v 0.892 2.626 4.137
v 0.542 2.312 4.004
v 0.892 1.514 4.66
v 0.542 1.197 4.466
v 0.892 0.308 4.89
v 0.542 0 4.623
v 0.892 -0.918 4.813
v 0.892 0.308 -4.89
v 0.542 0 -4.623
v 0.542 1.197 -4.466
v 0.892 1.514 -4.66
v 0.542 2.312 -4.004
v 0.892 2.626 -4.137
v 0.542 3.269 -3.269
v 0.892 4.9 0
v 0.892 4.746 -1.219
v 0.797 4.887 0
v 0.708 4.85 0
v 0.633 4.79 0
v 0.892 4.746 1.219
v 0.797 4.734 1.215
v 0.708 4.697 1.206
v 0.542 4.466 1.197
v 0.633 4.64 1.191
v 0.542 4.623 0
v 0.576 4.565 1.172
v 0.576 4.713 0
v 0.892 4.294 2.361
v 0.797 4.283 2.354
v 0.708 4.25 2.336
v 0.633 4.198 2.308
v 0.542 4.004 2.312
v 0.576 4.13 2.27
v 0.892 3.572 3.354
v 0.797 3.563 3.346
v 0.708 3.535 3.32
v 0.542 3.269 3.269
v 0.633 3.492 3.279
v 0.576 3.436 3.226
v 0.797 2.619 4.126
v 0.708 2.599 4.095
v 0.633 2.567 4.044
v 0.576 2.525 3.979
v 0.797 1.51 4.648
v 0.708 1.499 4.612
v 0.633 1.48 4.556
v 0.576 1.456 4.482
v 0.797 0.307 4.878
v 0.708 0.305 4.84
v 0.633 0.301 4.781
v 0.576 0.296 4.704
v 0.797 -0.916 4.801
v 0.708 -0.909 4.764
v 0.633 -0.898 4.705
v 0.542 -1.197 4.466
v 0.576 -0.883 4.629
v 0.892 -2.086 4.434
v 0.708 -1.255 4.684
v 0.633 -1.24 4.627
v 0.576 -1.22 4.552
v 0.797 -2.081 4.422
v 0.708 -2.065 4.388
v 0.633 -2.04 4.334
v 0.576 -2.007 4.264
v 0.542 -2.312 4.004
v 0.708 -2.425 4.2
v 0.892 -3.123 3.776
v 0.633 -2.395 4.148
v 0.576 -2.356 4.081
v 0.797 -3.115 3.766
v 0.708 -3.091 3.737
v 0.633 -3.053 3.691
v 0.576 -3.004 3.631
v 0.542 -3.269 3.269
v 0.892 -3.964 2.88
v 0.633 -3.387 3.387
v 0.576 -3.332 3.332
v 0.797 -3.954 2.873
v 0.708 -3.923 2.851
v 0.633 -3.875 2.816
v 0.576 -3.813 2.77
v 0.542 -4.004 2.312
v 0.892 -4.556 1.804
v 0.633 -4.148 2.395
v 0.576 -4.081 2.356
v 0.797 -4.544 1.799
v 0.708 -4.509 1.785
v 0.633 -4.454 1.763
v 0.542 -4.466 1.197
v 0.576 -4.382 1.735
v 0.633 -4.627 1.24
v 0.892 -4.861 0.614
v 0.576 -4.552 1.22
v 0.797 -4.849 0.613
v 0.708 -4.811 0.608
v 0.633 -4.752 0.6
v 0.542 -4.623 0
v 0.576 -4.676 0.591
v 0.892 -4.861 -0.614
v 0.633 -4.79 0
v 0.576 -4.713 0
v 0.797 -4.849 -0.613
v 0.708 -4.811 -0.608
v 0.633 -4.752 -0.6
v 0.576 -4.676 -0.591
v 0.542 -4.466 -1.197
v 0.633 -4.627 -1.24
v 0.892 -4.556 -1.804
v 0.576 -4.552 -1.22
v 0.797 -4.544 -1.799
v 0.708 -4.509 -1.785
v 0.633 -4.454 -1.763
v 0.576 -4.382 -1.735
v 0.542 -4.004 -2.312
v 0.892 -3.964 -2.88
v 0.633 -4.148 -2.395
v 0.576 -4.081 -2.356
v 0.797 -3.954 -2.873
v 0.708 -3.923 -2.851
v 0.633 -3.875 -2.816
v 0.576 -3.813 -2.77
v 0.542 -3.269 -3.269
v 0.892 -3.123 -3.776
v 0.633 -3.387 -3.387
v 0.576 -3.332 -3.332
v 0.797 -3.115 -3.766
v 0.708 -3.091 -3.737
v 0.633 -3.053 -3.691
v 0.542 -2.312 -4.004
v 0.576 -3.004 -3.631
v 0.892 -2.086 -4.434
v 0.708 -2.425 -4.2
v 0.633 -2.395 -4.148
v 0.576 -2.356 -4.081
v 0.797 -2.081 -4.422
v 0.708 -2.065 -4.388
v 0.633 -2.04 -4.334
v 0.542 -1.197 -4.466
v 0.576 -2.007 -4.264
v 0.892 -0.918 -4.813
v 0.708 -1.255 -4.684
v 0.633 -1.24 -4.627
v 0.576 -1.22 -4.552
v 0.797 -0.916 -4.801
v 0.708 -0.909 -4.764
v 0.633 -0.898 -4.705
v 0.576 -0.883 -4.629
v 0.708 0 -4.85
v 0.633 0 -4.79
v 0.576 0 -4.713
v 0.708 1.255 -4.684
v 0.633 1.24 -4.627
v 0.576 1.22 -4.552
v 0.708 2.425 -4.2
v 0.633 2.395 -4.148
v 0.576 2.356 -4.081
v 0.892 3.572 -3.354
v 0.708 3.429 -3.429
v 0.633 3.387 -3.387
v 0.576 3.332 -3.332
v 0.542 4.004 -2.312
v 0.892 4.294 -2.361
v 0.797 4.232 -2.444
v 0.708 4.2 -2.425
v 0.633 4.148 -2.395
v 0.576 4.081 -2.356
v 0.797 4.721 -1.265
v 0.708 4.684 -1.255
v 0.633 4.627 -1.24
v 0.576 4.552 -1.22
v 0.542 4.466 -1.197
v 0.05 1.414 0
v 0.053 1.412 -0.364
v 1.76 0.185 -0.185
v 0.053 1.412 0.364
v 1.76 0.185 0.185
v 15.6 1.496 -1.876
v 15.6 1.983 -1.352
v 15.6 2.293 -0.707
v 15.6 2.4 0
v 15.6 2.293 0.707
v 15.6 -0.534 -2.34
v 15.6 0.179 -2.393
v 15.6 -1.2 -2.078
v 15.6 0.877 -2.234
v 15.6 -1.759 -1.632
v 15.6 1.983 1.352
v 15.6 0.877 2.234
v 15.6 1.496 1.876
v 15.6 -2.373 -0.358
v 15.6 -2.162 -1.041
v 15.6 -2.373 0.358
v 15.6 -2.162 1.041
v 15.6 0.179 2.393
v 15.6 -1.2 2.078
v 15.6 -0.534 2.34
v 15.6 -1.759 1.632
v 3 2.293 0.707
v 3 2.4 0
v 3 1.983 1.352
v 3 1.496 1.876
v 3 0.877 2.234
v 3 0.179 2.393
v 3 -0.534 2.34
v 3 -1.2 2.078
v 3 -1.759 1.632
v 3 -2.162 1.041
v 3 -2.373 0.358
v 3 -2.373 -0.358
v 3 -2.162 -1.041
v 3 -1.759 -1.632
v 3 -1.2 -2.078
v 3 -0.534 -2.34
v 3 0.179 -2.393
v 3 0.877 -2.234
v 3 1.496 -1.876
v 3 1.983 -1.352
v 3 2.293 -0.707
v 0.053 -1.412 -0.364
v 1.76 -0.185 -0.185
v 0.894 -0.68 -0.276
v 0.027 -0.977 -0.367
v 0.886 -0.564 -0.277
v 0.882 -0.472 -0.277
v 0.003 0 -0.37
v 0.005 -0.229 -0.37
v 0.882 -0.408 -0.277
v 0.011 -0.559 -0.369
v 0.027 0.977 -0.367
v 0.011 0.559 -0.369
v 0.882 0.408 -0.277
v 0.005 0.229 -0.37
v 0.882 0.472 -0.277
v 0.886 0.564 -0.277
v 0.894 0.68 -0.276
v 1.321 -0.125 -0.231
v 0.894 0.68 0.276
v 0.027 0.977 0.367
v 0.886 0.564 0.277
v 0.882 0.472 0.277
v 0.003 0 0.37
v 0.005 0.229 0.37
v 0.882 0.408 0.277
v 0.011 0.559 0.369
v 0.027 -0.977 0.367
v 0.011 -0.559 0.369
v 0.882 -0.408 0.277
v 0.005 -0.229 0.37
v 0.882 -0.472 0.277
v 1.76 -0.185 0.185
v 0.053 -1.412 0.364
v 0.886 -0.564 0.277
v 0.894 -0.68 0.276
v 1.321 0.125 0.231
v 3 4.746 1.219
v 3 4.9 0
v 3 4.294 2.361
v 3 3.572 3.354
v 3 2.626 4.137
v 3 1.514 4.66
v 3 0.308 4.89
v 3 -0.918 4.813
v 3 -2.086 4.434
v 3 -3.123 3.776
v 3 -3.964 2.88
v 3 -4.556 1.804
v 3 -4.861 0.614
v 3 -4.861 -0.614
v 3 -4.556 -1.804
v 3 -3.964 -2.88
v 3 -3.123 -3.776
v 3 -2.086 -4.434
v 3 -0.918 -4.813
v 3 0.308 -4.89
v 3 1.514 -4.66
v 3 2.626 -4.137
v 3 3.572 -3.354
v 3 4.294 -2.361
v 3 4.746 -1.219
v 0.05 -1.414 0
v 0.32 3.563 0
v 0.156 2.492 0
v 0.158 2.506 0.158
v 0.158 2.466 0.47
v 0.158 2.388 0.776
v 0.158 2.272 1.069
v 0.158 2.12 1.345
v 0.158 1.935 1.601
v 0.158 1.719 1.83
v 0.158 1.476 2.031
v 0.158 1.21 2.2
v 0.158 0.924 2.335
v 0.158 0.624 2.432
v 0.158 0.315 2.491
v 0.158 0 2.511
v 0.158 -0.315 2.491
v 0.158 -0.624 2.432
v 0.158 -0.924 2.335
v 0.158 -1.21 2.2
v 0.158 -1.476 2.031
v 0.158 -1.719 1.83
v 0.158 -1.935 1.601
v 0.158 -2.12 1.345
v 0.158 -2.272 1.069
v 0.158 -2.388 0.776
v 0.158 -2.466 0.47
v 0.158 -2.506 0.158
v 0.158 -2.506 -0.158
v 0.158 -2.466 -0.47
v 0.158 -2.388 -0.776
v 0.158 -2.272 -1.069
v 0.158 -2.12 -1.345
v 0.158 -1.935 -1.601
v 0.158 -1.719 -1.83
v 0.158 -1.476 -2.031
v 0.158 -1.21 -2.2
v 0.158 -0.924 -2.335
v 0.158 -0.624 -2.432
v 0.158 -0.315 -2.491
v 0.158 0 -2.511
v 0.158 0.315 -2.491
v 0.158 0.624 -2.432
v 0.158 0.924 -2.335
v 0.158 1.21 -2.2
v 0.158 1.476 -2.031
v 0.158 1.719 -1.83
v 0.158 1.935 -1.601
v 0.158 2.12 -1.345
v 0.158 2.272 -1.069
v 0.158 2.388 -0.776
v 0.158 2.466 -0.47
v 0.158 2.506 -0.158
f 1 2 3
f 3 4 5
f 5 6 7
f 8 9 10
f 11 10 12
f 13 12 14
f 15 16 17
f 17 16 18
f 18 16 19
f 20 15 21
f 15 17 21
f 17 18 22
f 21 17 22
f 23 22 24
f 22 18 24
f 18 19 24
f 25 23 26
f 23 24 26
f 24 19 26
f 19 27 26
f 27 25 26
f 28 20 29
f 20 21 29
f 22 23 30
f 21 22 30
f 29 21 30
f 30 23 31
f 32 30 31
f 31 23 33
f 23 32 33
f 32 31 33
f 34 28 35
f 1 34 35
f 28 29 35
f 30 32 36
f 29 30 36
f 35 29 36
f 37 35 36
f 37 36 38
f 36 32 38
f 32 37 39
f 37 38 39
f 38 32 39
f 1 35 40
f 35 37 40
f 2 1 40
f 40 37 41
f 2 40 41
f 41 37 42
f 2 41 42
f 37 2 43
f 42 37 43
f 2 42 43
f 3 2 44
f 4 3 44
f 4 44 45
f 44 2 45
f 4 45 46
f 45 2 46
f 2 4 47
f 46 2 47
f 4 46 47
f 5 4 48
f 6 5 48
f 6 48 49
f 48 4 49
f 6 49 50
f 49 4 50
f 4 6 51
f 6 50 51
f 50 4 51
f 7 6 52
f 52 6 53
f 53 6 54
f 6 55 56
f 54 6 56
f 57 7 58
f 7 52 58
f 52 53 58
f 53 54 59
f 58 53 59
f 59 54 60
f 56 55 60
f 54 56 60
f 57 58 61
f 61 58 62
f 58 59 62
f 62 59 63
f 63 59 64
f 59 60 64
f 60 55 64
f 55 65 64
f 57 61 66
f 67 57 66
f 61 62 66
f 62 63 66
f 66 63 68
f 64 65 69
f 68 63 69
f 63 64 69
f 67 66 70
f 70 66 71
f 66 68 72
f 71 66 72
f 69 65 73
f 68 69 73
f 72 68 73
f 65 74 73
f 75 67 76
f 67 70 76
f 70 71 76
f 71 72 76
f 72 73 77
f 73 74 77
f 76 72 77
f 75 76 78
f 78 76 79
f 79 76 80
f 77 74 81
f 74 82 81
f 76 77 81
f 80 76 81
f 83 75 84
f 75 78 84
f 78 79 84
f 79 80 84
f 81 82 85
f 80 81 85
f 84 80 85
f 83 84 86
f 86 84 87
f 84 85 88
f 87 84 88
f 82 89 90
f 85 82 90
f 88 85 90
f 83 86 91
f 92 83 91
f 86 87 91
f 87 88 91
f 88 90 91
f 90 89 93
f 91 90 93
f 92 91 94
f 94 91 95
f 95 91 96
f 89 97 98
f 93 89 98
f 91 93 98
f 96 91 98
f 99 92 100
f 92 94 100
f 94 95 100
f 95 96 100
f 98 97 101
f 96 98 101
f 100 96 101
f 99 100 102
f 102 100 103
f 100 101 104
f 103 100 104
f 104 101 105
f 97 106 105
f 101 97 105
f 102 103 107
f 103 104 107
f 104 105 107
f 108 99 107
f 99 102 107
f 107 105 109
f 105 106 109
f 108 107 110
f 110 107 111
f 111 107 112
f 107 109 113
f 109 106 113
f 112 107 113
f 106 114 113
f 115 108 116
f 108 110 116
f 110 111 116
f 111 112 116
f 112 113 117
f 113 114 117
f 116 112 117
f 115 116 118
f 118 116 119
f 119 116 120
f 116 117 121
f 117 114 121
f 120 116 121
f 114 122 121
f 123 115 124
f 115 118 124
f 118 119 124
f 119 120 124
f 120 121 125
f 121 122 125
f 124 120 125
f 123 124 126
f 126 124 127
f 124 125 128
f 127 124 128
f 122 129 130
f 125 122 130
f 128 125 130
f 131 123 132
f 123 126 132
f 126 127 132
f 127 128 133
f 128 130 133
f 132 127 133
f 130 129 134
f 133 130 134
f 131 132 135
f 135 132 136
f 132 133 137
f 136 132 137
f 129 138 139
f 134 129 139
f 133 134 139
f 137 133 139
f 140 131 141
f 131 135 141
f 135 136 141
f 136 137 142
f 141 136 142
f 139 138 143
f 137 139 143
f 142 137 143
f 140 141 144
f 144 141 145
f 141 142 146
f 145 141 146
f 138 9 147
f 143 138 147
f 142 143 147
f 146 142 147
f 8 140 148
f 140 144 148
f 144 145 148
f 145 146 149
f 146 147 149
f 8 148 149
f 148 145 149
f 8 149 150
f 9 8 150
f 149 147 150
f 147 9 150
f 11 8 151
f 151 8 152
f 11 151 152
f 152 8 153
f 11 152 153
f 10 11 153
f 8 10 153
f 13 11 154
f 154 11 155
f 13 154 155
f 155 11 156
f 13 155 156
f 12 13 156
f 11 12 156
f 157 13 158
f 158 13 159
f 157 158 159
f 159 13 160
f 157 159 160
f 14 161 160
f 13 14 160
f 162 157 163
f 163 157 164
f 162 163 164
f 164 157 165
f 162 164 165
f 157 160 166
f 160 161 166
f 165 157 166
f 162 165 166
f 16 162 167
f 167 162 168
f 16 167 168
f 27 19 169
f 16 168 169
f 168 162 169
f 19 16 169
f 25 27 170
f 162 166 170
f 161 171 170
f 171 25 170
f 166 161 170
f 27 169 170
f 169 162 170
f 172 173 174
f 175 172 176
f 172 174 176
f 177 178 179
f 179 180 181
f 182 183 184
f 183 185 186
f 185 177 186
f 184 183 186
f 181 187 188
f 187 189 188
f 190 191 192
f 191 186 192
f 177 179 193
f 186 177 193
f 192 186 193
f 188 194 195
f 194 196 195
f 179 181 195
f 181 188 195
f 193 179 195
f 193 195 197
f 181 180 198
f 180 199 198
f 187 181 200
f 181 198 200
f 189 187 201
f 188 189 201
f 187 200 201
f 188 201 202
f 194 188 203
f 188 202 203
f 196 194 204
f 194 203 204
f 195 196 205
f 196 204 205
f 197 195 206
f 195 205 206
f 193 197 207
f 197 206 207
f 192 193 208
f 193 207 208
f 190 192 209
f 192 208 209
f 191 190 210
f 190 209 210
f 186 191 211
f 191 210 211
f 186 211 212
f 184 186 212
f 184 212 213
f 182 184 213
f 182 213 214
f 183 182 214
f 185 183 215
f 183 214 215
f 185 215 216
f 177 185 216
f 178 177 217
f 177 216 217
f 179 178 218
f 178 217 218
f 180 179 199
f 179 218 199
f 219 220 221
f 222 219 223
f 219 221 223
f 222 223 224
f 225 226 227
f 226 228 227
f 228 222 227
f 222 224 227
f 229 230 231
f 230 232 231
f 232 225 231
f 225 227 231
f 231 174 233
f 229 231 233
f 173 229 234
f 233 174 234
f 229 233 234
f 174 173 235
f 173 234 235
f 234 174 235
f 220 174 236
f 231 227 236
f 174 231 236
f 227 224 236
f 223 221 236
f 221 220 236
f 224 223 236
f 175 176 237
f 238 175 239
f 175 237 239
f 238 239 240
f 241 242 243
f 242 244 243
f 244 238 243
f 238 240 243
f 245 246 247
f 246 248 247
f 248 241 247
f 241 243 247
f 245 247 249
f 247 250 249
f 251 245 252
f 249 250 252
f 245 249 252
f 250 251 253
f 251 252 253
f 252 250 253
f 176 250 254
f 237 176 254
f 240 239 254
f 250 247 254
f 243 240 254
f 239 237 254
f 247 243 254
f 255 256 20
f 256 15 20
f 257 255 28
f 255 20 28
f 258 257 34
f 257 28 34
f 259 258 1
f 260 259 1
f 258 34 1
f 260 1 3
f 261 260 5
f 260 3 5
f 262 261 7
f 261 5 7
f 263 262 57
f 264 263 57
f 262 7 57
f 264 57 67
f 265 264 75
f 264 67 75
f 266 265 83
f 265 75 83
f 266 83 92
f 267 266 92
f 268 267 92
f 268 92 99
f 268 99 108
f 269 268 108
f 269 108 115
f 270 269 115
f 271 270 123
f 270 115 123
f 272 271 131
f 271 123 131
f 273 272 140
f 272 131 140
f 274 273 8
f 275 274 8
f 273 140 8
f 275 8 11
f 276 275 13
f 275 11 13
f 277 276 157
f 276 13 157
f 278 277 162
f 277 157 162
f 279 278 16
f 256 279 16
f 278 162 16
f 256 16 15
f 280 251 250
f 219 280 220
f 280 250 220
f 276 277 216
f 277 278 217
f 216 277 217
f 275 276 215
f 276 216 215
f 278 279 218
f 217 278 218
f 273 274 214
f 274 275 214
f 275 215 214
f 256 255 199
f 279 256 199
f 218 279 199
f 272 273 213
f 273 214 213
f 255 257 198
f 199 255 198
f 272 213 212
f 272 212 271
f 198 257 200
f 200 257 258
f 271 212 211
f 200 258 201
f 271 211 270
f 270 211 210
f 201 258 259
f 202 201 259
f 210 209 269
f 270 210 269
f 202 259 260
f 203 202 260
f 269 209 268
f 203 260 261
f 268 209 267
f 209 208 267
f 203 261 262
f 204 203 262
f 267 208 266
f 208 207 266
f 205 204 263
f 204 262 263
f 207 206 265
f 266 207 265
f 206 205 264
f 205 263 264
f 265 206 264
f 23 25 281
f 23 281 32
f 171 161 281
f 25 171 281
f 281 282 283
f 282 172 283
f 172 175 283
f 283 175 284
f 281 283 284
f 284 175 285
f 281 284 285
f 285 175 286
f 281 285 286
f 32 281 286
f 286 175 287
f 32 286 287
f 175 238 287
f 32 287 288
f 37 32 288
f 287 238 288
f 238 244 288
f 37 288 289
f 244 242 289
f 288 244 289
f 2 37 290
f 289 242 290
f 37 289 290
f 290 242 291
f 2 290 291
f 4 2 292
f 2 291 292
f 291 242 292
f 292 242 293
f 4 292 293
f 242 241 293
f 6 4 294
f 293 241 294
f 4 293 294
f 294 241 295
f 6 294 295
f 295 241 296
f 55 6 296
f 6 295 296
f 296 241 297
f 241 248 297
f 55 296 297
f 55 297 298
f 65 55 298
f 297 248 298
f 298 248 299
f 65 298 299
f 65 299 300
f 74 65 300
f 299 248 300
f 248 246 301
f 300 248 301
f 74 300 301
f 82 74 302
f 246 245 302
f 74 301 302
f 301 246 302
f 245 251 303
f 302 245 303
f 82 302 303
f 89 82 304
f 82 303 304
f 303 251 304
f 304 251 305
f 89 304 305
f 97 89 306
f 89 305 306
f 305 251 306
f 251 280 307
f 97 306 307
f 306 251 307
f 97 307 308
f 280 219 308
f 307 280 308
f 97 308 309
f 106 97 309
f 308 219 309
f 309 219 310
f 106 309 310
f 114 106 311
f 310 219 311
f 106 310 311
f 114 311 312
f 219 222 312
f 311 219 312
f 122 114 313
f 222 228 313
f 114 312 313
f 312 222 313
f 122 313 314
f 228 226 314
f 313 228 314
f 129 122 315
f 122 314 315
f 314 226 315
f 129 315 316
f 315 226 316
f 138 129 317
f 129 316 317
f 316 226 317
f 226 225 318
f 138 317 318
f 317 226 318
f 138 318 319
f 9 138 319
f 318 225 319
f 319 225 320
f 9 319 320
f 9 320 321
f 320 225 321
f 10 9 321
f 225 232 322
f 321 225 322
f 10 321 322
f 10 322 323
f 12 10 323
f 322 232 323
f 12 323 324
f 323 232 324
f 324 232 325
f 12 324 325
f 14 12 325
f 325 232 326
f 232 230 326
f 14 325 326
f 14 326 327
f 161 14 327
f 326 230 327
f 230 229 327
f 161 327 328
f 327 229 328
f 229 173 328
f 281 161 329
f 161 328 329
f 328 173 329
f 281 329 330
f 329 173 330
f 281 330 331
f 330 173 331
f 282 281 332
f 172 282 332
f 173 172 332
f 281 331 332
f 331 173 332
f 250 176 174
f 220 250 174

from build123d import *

# Parameters (mm, degrees)
SKETCH3_W = 0.74
SKETCH3_H = 2.9
SKETCH4_W = 0.37
SKETCH4_H = 0.37


with BuildPart() as part:
    # BodySke → Base-Revolve (revolve)
    with BuildSketch(Plane.XY):
        with BuildLine():
            Line((3, 2.4), (3, 4.9))
            Line((3, 4.9), (0.891938874, 4.9))
            ThreePointArc((0.891938874, 4.9), (0.668733198, 4.822452166), (0.541689281, 4.623217923))
            ThreePointArc((0.541689281, 4.623217923), (0.135883931, 2.327421923), (0, 0))
            Line((0, 0), (15.6, 0))
            Line((15.6, 0), (15.6, 2.4))
            Line((15.6, 2.4), (3, 2.4))
        make_face()
    revolve(axis=Axis((-25.4, 0, 0), (1, 0, 0)))

    # Sketch3 → Cut-Loft1 section 0
    with BuildSketch(Plane(origin=(0, 0, 0), x_dir=(0, 0, -1), z_dir=(1, 0, 0))):
        Rectangle(SKETCH3_W, SKETCH3_H)
    # Sketch4 → Cut-Loft1 section 1
    with BuildSketch(Plane(origin=(1.76, 0, 0), x_dir=(0, 0, -1), z_dir=(1, 0, 0))):
        Rectangle(SKETCH4_W, SKETCH4_H)
    loft(mode=Mode.SUBTRACT)


solid = part.part
